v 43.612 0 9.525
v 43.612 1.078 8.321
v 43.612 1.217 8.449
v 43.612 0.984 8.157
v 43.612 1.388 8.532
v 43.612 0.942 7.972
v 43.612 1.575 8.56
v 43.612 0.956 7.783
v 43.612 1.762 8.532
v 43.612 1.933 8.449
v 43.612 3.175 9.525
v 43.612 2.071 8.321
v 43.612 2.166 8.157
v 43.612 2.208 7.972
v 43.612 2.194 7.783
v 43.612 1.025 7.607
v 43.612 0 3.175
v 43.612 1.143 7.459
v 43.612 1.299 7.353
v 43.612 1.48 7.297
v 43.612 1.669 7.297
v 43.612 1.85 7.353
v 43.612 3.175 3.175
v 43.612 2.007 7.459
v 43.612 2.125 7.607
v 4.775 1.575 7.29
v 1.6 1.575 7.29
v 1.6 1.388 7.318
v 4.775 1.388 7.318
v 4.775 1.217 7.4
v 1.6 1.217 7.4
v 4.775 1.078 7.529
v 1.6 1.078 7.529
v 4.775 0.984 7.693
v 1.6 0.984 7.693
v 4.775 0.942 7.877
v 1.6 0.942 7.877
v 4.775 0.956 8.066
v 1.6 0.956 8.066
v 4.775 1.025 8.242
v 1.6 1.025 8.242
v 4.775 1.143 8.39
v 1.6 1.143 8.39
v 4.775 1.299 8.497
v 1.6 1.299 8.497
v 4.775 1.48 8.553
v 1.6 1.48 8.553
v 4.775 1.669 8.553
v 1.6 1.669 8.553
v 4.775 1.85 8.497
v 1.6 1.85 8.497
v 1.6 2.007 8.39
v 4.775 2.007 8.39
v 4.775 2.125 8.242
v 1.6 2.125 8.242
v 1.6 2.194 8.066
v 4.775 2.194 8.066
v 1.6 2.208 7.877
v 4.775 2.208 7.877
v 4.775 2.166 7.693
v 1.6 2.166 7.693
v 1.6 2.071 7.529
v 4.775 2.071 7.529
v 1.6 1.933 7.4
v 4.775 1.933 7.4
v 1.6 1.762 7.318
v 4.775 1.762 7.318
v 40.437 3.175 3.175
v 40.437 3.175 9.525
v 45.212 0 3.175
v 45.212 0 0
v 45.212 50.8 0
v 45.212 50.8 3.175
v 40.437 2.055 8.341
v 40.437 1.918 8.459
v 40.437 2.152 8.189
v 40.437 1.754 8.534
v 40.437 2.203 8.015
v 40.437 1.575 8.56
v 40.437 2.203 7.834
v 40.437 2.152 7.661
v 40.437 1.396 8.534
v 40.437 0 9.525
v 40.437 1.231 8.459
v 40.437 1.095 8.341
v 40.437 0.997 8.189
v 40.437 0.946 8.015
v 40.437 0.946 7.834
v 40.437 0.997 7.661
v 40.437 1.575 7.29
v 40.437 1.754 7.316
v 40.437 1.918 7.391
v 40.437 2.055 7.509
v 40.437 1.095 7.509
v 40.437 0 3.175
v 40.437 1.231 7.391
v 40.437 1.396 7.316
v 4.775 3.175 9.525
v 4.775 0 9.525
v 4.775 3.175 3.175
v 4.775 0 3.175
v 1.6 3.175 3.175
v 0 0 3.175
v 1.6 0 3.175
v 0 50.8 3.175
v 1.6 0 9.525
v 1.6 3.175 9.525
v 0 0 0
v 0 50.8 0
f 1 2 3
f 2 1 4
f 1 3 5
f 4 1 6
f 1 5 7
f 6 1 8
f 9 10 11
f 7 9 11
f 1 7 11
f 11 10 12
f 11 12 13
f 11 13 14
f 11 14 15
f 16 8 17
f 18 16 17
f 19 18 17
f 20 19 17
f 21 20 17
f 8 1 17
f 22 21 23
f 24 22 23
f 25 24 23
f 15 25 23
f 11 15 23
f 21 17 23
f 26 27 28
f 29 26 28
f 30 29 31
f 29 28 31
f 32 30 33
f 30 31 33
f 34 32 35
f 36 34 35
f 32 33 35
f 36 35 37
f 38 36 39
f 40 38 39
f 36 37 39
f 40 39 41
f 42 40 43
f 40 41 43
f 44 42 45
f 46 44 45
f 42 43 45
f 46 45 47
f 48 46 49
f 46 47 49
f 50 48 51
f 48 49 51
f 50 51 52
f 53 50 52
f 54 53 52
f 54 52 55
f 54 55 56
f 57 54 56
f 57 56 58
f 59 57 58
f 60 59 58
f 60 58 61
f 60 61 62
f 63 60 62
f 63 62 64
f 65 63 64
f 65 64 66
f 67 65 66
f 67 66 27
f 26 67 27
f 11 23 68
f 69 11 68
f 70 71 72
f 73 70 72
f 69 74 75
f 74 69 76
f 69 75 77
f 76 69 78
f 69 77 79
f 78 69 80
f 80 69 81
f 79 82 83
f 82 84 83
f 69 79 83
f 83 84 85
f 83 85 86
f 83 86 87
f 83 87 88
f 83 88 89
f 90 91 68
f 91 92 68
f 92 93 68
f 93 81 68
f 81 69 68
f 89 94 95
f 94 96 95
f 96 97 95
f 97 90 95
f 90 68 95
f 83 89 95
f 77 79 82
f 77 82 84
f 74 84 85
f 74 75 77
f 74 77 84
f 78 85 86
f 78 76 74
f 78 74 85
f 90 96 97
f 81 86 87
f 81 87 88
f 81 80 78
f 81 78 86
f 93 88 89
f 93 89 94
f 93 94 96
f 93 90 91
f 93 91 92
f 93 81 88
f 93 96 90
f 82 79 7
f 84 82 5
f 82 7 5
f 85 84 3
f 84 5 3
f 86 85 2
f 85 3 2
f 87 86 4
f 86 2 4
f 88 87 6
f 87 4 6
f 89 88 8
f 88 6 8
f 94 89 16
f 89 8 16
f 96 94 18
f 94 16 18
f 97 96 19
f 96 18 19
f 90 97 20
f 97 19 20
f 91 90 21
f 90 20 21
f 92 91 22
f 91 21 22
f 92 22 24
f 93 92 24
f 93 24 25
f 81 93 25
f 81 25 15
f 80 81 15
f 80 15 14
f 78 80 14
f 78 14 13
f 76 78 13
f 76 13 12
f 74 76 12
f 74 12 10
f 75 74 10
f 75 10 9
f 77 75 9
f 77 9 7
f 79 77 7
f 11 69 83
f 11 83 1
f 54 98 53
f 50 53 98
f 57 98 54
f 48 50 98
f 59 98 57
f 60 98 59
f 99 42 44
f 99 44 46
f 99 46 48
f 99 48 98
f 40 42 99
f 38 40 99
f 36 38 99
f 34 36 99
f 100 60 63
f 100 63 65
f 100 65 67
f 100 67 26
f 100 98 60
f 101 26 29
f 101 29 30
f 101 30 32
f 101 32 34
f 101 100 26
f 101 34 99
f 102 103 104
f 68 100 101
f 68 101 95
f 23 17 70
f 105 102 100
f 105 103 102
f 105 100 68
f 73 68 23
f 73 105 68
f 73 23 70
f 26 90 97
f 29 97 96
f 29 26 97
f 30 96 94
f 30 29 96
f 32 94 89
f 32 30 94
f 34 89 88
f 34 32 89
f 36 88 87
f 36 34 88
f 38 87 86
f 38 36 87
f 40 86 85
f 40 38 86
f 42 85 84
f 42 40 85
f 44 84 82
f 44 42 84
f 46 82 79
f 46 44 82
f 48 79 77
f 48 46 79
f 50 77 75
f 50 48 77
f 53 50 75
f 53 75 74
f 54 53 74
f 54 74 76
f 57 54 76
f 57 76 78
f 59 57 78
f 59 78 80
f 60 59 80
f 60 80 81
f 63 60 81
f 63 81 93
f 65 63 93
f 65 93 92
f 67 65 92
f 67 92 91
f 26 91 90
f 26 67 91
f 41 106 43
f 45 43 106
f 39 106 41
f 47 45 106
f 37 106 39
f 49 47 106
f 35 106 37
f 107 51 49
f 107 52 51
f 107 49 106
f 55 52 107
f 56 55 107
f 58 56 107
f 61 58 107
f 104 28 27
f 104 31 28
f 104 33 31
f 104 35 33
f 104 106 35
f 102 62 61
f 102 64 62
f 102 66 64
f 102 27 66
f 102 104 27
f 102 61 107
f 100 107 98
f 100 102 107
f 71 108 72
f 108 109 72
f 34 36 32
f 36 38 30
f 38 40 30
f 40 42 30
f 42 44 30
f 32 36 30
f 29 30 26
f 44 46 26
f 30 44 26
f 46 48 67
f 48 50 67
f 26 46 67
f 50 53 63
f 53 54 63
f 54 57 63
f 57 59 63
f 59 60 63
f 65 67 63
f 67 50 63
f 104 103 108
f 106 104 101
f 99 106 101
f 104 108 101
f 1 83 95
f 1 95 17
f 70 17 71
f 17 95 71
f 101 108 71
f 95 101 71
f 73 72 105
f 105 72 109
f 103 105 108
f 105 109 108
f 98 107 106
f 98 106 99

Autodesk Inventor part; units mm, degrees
ref_plane "YZ Plane" through (0, 0, 0) normal (1, 0, 0) x (0, 1, 0)
ref_plane "XZ Plane" through (0, 0, 0) normal (0, 1, 0) x (-1, 0, 0)
ref_plane "XY Plane" through (0, 0, 0) normal (0, 0, 1) x (1, 0, 0)
sketch "Sketch1" plane through (0, 0, 0) normal (0, 0, 1) x (1, 0, 0)
  line L0 (0, 0) -> (45.212, 0)
  line L1 (45.212, 0) -> (45.212, 50.8)
  line L2 (45.212, 50.8) -> (0, 50.8)
  line L3 (0, 50.8) -> (0, 0)
  dimension "d0" = 45.212
  dimension "d1" = 50.8
extrude "Extrusion1" add sketch "Sketch1" along normal blind 3.175
sketch "Sketch2" plane through (0, 0, 3.175) normal (0, 0, 1) x (1, 0, 0)
  line L0 (0, 0) -> (45.212, 0) projected
  line L1 (1.6002, 3.175) -> (4.7752, 3.175)
  line L2 (4.7752, 3.175) -> (4.7752, 0)
  line L3 (4.7752, 0) -> (1.6002, 0)
  line L4 (1.6002, 0) -> (1.6002, 3.175)
  dimension "d4" = 3.175
  dimension "d30" = 1.6002
extrude "Extrusion2" add sketch "Sketch2" along normal blind 6.35
sketch "Sketch3" plane through (0, 0, 3.175) normal (0, 0, 1) x (1, 0, 0)
  line L0 (4.7752, 0) -> (45.212, 0) projected
  line L1 (43.6118, 3.175) -> (40.4368, 3.175)
  line L2 (40.4368, 3.175) -> (40.4368, 0)
  line L3 (40.4368, 0) -> (43.6118, 0)
  line L4 (43.6118, 0) -> (43.6118, 3.175)
  line L5 (45.212, 0) -> (45.212, 50.8) projected
  point P0 (0, 0)
  dimension "d7" = 3.175
  dimension "d31" = 1.6002
extrude "Extrusion3" add sketch "Sketch3" along normal blind 6.35
hole "Hole1" at (4.7752, 1.5748, 7.9248) direction (-1, 0, 0) diameter 1.27 end through all
hole "Hole2" at (40.4368, 1.5748, 7.9248) direction (1, 0, 0) diameter 1.27 end through all
sketch "Sketch4" plane through (4.7752, 0, 3.175) normal (1, 0, 0) x (0, 0, -1)
  point P0 (3.175, 0)
  point P1 (-4.7498, 1.5748)
extrude "Extrusion4" [suppressed]
sketch "Sketch5" plane through (4.7752, 0, 3.175) normal (1, 0, 0) x (0, 0, -1)
  point P0 (3.175, 0)
sketch "Sketch6" plane through (4.7752, 0, 3.175) normal (1, 0, 0) x (0, 0, -1)
  circle A0 centre (-4.7498, 1.5748) radius 0.635 projected
  circle A1 centre (-4.7498, 1.5748) radius 0.635
  point P0 (3.175, 0)
extrude "Extrusion5" add sketch "Sketch6" along normal blind 35.6616
properties part number "HingPartUno"
